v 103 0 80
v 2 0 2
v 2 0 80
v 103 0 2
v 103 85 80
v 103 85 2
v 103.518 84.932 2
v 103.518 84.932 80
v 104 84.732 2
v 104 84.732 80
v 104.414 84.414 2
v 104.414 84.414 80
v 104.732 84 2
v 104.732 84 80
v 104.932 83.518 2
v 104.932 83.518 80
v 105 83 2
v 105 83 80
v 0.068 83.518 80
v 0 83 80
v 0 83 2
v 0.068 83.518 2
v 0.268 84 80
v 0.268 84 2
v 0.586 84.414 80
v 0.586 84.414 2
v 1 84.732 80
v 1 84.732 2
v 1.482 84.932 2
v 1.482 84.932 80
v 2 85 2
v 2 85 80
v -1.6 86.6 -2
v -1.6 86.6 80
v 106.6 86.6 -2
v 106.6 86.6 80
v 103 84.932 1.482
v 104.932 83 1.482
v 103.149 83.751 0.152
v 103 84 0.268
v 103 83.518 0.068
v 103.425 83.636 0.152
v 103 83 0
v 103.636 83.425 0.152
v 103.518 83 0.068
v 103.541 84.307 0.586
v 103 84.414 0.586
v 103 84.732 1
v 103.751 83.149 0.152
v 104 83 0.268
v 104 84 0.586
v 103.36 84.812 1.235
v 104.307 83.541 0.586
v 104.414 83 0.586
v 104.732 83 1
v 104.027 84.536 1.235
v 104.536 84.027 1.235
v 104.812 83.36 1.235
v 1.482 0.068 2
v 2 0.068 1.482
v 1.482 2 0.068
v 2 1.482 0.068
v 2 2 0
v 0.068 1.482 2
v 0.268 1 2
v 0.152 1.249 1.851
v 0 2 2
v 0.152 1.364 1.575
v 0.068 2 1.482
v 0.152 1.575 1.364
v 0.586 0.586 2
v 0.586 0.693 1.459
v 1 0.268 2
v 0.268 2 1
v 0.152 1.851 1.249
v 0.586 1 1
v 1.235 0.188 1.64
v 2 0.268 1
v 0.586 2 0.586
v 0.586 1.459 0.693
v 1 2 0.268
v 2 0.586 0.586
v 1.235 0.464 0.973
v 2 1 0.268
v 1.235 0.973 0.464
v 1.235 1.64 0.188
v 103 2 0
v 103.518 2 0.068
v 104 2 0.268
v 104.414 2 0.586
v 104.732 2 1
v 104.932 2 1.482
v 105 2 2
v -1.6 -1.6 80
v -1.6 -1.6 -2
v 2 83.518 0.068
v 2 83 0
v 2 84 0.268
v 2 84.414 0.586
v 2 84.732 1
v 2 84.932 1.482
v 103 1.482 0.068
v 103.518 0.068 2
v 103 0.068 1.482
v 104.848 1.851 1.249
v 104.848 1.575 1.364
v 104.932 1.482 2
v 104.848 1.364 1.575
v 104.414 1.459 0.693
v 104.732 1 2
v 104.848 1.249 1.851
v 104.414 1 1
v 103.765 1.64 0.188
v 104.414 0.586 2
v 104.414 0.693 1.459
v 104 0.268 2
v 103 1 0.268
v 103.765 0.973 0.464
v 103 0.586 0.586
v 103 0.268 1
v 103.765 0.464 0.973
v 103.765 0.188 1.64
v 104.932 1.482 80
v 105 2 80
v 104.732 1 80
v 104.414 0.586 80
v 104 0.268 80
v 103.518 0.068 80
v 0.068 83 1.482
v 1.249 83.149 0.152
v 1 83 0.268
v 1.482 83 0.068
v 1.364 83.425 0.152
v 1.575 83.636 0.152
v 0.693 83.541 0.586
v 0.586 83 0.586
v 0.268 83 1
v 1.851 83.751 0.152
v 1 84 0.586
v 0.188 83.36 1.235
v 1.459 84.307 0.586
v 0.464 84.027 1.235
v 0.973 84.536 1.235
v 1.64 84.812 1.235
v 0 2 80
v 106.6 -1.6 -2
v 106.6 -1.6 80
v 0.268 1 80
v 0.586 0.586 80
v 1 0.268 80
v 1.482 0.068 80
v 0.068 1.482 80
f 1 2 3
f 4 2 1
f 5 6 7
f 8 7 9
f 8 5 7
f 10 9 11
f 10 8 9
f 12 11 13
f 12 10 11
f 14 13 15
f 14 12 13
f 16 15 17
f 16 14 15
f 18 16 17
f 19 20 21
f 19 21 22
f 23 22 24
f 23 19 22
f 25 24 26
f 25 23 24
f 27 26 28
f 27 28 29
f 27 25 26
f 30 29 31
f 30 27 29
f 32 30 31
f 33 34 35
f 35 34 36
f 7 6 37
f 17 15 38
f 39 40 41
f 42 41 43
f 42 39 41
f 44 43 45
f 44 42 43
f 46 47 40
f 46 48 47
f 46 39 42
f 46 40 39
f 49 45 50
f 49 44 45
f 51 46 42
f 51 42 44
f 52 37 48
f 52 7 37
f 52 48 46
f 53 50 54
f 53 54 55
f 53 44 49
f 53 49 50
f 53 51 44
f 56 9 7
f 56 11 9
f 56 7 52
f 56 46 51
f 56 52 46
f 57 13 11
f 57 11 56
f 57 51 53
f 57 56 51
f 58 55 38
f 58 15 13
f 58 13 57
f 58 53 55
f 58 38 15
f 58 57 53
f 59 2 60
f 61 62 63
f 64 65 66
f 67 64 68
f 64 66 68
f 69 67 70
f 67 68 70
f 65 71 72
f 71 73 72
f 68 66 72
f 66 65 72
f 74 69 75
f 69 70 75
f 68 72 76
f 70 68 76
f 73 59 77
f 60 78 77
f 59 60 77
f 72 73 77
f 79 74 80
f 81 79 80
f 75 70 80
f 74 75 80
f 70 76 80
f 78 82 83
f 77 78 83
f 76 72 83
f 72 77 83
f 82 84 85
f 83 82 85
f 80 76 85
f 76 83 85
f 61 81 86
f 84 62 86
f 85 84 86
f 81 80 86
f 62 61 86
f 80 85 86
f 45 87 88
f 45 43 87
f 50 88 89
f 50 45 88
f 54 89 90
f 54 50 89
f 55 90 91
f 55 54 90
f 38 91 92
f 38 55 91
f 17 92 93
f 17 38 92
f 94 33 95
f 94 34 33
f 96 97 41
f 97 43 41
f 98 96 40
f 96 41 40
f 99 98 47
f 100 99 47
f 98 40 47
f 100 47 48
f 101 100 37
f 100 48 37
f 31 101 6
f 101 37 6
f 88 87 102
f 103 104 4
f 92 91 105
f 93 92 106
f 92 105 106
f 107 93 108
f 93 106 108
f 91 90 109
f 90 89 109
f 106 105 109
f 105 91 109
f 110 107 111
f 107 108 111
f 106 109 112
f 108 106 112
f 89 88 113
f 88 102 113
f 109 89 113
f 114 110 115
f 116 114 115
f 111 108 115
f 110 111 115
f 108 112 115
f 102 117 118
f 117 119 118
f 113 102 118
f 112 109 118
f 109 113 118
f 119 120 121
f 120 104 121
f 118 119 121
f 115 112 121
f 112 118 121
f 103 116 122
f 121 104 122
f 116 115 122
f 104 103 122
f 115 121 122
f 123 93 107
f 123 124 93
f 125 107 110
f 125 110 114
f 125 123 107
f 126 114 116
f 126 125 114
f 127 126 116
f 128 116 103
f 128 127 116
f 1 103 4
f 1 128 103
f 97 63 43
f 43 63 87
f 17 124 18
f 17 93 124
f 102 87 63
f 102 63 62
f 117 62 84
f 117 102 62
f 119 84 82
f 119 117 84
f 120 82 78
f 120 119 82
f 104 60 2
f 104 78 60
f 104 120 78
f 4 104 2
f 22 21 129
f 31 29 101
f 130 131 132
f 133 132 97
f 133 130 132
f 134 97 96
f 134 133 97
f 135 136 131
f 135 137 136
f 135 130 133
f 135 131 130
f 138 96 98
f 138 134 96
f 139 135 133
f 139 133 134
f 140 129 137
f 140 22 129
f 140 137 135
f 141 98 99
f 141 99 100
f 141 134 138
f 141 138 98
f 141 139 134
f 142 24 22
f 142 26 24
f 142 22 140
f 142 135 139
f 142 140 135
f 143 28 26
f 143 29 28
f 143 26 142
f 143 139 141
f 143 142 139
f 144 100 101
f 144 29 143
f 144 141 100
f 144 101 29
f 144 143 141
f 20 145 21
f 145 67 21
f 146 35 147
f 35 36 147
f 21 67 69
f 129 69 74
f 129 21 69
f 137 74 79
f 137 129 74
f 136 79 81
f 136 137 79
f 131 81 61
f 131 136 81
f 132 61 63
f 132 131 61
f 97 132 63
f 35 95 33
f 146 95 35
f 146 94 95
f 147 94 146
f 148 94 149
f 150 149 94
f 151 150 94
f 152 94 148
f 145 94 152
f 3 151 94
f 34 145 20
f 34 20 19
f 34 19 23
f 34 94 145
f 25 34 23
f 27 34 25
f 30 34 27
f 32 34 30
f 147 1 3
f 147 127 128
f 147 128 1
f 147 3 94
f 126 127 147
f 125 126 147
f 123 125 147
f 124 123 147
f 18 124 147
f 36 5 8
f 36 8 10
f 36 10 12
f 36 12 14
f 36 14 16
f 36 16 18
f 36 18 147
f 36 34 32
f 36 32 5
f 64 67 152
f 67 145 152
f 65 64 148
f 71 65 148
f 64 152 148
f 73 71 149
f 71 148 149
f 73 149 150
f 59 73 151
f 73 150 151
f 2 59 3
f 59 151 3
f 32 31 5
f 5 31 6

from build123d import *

# Parameters (mm, degrees)
F0_W     = 108.2
F0_H     = 88.2
F0_W_2   = 105
F0_H_2   = 85
F1_DEPTH = 80
F2_W     = 108.2
F2_H     = 88.2
F2_W_2   = 105
F2_H_2   = 85
F3_DEPTH = 2
F4_R     = 2


with BuildPart() as f1:
    # F0 (on Top) → F1 (new body)
    with BuildSketch(Plane.XY):
        with Locations((52.5, 42.5)):
            Rectangle(F0_W, F0_H)
        with Locations((52.5, 42.5)):
            Rectangle(F0_W_2, F0_H_2, mode=Mode.SUBTRACT)
    extrude(amount=F1_DEPTH)

    # F2 (on face) → F3 (join)
    with BuildSketch(Plane(origin=(0, 0, 0), x_dir=(1, 0, 0), z_dir=(0, 0, -1))):
        with Locations((52.5, -42.5)):
            Rectangle(F2_W, F2_H)
        with Locations((52.5, -42.5)):
            Rectangle(F2_W_2, F2_H_2, mode=Mode.SUBTRACT)
        with Locations((52.5, -42.5)):
            Rectangle(F2_W_2, F2_H_2)
    extrude(amount=F3_DEPTH)

    # F4
    f4_edges = [f1.edges().sort_by_distance(p)[0] for p in [
        (0, 85, 40),
        (105, 85, 40),
        (52.5, 0, 0),
        (0, 0, 40),
        (0, 42.5, 0),
        (52.5, 85, 0),
        (105, 42.5, 0),
        (105, 0, 40),
    ]]
    fillet(f4_edges, radius=F4_R)


solid = f1.part
